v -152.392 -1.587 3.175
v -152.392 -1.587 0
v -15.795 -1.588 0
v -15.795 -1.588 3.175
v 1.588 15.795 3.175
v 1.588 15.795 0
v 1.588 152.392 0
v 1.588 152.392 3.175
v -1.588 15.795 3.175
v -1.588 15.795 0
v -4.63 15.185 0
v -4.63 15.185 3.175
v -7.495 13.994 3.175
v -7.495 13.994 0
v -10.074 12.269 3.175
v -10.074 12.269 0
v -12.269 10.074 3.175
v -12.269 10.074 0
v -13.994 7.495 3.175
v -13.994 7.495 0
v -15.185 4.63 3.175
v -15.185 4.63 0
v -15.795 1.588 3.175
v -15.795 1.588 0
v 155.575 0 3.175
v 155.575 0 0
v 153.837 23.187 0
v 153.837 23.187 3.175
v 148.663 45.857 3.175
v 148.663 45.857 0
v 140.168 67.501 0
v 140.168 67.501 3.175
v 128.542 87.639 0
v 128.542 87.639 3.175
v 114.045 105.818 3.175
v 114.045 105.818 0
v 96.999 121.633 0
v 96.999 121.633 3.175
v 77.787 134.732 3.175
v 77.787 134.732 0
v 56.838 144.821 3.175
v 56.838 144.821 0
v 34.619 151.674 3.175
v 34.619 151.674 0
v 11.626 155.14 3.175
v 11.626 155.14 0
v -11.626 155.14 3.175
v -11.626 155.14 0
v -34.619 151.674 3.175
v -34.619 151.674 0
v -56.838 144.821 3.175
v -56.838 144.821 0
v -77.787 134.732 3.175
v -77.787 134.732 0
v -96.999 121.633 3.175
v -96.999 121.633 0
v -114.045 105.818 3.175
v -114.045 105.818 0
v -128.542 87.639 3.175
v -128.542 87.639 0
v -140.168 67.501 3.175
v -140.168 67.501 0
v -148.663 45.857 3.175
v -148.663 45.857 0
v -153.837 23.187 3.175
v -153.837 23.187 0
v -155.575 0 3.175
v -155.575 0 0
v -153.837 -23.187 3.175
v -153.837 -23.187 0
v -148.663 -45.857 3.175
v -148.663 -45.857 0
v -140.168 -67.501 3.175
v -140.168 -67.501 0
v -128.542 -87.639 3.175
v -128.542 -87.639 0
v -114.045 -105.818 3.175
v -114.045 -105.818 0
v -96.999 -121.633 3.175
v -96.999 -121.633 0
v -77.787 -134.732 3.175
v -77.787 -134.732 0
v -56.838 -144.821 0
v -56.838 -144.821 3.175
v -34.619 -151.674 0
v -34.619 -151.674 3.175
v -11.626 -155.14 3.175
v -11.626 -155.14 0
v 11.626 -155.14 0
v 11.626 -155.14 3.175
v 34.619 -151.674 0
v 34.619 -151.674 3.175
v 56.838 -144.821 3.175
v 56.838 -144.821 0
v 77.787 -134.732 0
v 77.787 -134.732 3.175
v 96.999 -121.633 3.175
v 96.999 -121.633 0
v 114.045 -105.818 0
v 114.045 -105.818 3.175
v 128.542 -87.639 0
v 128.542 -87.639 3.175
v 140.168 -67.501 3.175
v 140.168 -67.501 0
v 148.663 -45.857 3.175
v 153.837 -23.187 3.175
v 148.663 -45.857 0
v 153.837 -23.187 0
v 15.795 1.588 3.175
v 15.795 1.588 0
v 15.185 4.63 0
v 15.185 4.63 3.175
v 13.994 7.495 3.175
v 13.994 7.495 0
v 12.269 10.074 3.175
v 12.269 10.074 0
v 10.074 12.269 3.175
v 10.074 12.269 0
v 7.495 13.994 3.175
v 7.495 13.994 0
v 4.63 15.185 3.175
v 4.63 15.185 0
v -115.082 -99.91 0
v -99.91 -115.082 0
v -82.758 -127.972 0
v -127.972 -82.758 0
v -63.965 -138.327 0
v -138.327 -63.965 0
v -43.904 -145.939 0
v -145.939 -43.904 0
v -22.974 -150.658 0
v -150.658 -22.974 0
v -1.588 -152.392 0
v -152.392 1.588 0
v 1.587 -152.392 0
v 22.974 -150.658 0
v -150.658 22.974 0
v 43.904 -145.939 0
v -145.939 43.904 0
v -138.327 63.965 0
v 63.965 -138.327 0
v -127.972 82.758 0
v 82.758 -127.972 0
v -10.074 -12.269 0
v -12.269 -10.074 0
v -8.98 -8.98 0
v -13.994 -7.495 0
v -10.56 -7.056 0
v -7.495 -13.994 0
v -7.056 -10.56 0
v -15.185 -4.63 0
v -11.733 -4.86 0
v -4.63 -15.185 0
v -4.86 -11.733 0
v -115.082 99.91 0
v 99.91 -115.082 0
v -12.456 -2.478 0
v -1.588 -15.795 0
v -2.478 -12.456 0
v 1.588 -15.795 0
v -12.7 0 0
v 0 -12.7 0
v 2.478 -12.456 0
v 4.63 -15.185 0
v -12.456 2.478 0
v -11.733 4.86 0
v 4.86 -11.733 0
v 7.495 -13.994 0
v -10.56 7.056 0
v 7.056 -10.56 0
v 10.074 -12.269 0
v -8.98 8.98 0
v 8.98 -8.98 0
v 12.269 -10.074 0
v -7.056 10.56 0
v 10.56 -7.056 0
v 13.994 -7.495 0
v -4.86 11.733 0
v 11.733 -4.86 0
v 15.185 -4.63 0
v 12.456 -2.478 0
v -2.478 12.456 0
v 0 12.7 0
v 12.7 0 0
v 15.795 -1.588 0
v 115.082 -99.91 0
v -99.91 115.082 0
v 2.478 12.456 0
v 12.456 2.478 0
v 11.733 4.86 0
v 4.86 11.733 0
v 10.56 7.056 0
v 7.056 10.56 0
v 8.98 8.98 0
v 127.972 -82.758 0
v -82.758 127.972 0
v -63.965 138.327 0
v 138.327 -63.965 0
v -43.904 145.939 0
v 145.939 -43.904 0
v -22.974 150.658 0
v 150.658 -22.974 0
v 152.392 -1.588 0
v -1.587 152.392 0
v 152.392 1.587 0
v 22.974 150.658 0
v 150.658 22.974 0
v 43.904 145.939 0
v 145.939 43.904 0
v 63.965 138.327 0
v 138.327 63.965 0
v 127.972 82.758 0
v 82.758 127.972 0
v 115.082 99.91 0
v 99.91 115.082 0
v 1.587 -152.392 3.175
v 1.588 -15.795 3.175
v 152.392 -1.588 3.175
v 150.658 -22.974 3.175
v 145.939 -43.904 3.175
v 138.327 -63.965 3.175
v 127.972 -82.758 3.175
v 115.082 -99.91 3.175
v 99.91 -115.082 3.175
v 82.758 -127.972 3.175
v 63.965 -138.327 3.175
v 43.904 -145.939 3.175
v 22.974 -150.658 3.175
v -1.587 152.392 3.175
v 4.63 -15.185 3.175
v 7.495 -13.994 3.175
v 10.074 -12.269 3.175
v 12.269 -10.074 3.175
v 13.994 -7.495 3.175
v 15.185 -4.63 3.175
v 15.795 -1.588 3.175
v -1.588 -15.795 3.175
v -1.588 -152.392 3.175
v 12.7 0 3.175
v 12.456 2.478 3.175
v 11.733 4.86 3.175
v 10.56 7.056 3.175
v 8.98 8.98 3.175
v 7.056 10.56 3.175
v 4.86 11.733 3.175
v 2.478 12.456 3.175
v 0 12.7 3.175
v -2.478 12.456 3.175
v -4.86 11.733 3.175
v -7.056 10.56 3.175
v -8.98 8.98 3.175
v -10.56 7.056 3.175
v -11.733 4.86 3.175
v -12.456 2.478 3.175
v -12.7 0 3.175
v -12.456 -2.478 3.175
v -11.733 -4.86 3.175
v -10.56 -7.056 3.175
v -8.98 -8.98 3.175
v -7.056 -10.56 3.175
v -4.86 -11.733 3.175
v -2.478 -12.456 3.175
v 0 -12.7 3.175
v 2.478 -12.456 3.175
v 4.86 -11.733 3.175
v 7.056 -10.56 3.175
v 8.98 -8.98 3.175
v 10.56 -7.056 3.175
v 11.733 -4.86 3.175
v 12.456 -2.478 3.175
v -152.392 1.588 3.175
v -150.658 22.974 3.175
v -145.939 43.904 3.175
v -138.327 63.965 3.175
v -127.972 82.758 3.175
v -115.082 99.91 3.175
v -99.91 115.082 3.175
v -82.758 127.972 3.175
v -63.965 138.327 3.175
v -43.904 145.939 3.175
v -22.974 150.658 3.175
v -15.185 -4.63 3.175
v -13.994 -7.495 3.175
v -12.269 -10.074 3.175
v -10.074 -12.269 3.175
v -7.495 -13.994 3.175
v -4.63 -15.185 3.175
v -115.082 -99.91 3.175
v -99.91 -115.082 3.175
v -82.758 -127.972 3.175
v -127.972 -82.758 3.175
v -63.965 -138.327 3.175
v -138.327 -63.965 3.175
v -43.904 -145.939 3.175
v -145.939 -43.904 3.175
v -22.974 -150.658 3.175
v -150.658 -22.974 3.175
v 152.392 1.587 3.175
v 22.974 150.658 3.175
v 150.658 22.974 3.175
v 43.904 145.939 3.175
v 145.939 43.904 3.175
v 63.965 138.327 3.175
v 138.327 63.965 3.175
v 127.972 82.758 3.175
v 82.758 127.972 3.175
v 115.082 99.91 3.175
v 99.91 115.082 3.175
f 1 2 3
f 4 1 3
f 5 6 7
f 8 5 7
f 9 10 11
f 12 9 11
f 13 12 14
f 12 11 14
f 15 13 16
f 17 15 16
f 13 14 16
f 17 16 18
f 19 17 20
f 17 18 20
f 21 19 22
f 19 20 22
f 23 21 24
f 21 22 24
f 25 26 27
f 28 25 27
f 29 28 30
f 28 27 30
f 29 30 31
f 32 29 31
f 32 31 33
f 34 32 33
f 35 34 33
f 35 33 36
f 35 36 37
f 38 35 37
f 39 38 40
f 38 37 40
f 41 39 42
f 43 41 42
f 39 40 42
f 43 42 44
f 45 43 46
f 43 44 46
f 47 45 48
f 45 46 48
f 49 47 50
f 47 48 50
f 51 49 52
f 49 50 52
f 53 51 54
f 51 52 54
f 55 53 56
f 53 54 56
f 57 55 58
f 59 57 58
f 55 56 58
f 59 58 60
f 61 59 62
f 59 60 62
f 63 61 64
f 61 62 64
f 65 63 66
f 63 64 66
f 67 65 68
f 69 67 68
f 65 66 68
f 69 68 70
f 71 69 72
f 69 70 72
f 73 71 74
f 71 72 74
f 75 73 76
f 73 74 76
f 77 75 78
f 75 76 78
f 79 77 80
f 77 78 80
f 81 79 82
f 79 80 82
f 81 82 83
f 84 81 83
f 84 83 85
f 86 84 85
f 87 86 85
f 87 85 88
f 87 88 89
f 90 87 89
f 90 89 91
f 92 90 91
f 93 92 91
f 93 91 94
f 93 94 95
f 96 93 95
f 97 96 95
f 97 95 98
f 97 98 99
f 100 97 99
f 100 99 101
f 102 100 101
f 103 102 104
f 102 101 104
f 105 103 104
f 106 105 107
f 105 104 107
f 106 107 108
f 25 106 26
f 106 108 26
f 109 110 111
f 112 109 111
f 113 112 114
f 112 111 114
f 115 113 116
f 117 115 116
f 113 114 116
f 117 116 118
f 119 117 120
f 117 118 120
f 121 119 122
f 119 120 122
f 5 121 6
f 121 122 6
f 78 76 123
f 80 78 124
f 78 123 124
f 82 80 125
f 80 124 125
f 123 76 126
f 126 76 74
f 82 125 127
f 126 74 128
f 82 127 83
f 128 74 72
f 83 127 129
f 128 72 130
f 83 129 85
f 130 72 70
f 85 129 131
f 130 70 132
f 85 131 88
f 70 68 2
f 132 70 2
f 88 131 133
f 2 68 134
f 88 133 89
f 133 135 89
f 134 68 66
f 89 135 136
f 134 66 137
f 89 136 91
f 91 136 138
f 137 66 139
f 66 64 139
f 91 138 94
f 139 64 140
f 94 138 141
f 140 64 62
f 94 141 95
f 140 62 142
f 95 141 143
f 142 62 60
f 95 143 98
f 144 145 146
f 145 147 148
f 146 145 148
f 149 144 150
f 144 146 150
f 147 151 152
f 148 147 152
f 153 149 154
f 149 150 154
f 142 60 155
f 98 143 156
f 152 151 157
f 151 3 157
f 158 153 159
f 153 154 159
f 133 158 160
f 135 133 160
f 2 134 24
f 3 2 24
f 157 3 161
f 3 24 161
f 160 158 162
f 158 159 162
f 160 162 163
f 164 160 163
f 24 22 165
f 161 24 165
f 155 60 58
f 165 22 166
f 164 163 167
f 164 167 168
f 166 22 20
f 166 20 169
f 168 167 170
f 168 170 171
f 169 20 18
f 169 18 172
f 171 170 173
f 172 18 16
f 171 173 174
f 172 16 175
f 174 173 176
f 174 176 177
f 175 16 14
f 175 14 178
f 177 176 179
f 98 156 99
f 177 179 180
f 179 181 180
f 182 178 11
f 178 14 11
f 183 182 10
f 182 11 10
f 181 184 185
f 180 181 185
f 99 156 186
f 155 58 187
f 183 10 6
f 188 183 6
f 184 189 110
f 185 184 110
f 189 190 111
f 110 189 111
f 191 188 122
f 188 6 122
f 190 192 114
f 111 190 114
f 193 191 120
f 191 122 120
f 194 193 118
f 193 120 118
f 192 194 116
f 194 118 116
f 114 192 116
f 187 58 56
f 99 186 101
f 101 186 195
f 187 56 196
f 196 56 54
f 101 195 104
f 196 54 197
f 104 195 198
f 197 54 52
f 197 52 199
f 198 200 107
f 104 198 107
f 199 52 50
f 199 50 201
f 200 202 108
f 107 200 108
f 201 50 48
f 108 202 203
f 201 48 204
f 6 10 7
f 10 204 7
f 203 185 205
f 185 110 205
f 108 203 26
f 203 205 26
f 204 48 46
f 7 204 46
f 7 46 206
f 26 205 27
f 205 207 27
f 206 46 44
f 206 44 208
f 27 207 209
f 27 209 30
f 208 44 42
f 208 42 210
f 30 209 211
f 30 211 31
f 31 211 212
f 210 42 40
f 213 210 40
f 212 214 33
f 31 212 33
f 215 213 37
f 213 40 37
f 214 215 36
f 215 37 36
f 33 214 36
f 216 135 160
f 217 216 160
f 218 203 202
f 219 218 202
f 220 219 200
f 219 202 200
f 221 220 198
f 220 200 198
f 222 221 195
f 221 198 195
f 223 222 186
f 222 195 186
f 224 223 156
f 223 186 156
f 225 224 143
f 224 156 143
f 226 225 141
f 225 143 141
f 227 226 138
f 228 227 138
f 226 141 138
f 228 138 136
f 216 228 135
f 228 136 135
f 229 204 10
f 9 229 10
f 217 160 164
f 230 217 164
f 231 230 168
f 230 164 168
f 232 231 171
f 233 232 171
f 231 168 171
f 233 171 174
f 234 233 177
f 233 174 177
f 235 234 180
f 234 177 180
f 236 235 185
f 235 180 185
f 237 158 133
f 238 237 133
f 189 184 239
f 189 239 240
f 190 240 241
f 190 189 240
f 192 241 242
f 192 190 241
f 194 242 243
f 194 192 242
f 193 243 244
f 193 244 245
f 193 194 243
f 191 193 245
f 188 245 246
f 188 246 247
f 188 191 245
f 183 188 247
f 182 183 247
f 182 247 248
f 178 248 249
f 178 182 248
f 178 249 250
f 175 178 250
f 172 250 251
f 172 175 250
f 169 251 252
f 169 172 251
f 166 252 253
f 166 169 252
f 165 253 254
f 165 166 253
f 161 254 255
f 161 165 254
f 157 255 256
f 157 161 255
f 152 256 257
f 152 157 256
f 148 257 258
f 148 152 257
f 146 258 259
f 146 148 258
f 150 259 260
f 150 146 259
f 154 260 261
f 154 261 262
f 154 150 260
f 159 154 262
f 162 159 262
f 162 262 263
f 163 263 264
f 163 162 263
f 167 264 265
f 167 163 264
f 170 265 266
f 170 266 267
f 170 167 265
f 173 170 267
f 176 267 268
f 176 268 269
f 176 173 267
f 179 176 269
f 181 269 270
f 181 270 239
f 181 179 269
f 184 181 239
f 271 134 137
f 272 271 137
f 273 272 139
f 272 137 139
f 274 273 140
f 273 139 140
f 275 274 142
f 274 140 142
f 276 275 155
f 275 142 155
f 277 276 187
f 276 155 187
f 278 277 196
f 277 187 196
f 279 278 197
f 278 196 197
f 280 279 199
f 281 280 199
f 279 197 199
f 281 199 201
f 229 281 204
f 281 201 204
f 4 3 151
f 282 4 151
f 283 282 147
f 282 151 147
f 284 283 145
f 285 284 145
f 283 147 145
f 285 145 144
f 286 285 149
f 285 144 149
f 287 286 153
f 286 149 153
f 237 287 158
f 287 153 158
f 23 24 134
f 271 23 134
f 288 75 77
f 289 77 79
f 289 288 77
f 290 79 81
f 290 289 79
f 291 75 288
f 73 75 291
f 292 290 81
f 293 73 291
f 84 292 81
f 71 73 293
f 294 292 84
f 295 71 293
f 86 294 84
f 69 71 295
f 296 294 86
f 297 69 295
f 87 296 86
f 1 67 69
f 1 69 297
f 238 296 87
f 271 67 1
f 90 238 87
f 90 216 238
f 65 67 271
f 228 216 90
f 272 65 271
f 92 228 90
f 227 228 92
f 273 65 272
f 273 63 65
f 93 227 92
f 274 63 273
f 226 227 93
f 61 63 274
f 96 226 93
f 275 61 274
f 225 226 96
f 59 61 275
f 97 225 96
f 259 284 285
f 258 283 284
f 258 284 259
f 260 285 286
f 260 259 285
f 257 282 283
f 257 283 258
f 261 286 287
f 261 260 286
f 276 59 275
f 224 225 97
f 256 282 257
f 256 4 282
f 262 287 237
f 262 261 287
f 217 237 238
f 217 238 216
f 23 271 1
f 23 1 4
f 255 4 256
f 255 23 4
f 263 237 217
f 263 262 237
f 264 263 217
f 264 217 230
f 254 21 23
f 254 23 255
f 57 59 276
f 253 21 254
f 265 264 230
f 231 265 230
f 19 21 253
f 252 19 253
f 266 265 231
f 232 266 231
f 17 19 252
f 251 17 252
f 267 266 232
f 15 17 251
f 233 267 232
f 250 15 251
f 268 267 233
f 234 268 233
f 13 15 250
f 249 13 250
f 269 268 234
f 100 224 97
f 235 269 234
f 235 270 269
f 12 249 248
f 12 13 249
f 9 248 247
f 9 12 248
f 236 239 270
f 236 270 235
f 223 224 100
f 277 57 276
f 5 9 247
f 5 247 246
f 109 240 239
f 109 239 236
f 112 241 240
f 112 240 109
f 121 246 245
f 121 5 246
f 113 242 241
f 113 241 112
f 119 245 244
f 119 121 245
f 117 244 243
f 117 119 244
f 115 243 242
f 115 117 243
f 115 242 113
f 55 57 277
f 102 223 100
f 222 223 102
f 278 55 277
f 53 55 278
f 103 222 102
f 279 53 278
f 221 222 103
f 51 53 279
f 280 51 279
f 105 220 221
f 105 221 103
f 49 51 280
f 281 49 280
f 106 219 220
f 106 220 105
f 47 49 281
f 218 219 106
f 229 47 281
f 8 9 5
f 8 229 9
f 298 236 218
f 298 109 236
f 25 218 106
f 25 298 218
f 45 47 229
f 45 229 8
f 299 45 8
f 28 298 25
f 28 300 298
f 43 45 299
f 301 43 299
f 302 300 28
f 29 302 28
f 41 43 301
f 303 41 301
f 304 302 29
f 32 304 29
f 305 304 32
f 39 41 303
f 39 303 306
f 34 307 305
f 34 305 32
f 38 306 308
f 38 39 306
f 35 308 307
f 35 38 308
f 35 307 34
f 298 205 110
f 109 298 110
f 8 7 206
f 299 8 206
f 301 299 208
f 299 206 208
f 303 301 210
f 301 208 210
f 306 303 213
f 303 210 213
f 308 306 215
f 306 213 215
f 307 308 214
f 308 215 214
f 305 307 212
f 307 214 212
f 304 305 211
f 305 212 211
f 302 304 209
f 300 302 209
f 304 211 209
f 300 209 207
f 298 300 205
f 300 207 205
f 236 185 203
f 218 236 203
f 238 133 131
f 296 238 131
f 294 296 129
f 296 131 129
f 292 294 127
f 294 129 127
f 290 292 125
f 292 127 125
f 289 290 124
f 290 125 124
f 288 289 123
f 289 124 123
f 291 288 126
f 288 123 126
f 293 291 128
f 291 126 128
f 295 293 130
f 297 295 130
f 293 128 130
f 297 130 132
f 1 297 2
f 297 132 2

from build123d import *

# Parameters (mm, degrees)
F0_R     = 155.575
F0_R_2   = 12.7
F1_DEPTH = 3.175


with BuildPart() as f1:
    # F0 (on Top) → F1 (new body)
    with BuildSketch(Plane.XY):
        Circle(F0_R)
        with BuildLine():
            Line((-1.5875, -15.795426), (-1.5875, -152.391732))
            ThreePointArc((-1.5875, -152.391732), (-107.763073, -107.763073), (-152.391732, -1.5875))
            Line((-152.391732, -1.5875), (-15.795426, -1.5875))
            ThreePointArc((-15.795426, -1.5875), (-11.22532, -11.22532), (-1.5875, -15.795426))
        make_face(mode=Mode.SUBTRACT)
        with BuildLine():
            ThreePointArc((152.391732, -1.5875), (107.763073, -107.763073), (1.5875, -152.391732))
            Line((1.5875, -152.391732), (1.5875, -15.795426))
            ThreePointArc((1.5875, -15.795426), (11.22532, -11.22532), (15.795426, -1.5875))
            Line((15.795426, -1.5875), (152.391732, -1.5875))
        make_face(mode=Mode.SUBTRACT)
        with BuildLine():
            ThreePointArc((-152.391732, 1.5875), (-107.763073, 107.763073), (-1.5875, 152.391732))
            Line((-1.5875, 152.391732), (-1.5875, 15.795426))
            ThreePointArc((-1.5875, 15.795426), (-11.22532, 11.22532), (-15.795426, 1.5875))
            Line((-15.795426, 1.5875), (-152.391732, 1.5875))
        make_face(mode=Mode.SUBTRACT)
        Circle(F0_R_2, mode=Mode.SUBTRACT)
        with BuildLine():
            Line((1.5875, 15.795426), (1.5875, 152.391732))
            ThreePointArc((1.5875, 152.391732), (107.763073, 107.763073), (152.391732, 1.5875))
            Line((152.391732, 1.5875), (15.795426, 1.5875))
            ThreePointArc((15.795426, 1.5875), (11.22532, 11.22532), (1.5875, 15.795426))
        make_face(mode=Mode.SUBTRACT)
    extrude(amount=F1_DEPTH)


solid = f1.part
